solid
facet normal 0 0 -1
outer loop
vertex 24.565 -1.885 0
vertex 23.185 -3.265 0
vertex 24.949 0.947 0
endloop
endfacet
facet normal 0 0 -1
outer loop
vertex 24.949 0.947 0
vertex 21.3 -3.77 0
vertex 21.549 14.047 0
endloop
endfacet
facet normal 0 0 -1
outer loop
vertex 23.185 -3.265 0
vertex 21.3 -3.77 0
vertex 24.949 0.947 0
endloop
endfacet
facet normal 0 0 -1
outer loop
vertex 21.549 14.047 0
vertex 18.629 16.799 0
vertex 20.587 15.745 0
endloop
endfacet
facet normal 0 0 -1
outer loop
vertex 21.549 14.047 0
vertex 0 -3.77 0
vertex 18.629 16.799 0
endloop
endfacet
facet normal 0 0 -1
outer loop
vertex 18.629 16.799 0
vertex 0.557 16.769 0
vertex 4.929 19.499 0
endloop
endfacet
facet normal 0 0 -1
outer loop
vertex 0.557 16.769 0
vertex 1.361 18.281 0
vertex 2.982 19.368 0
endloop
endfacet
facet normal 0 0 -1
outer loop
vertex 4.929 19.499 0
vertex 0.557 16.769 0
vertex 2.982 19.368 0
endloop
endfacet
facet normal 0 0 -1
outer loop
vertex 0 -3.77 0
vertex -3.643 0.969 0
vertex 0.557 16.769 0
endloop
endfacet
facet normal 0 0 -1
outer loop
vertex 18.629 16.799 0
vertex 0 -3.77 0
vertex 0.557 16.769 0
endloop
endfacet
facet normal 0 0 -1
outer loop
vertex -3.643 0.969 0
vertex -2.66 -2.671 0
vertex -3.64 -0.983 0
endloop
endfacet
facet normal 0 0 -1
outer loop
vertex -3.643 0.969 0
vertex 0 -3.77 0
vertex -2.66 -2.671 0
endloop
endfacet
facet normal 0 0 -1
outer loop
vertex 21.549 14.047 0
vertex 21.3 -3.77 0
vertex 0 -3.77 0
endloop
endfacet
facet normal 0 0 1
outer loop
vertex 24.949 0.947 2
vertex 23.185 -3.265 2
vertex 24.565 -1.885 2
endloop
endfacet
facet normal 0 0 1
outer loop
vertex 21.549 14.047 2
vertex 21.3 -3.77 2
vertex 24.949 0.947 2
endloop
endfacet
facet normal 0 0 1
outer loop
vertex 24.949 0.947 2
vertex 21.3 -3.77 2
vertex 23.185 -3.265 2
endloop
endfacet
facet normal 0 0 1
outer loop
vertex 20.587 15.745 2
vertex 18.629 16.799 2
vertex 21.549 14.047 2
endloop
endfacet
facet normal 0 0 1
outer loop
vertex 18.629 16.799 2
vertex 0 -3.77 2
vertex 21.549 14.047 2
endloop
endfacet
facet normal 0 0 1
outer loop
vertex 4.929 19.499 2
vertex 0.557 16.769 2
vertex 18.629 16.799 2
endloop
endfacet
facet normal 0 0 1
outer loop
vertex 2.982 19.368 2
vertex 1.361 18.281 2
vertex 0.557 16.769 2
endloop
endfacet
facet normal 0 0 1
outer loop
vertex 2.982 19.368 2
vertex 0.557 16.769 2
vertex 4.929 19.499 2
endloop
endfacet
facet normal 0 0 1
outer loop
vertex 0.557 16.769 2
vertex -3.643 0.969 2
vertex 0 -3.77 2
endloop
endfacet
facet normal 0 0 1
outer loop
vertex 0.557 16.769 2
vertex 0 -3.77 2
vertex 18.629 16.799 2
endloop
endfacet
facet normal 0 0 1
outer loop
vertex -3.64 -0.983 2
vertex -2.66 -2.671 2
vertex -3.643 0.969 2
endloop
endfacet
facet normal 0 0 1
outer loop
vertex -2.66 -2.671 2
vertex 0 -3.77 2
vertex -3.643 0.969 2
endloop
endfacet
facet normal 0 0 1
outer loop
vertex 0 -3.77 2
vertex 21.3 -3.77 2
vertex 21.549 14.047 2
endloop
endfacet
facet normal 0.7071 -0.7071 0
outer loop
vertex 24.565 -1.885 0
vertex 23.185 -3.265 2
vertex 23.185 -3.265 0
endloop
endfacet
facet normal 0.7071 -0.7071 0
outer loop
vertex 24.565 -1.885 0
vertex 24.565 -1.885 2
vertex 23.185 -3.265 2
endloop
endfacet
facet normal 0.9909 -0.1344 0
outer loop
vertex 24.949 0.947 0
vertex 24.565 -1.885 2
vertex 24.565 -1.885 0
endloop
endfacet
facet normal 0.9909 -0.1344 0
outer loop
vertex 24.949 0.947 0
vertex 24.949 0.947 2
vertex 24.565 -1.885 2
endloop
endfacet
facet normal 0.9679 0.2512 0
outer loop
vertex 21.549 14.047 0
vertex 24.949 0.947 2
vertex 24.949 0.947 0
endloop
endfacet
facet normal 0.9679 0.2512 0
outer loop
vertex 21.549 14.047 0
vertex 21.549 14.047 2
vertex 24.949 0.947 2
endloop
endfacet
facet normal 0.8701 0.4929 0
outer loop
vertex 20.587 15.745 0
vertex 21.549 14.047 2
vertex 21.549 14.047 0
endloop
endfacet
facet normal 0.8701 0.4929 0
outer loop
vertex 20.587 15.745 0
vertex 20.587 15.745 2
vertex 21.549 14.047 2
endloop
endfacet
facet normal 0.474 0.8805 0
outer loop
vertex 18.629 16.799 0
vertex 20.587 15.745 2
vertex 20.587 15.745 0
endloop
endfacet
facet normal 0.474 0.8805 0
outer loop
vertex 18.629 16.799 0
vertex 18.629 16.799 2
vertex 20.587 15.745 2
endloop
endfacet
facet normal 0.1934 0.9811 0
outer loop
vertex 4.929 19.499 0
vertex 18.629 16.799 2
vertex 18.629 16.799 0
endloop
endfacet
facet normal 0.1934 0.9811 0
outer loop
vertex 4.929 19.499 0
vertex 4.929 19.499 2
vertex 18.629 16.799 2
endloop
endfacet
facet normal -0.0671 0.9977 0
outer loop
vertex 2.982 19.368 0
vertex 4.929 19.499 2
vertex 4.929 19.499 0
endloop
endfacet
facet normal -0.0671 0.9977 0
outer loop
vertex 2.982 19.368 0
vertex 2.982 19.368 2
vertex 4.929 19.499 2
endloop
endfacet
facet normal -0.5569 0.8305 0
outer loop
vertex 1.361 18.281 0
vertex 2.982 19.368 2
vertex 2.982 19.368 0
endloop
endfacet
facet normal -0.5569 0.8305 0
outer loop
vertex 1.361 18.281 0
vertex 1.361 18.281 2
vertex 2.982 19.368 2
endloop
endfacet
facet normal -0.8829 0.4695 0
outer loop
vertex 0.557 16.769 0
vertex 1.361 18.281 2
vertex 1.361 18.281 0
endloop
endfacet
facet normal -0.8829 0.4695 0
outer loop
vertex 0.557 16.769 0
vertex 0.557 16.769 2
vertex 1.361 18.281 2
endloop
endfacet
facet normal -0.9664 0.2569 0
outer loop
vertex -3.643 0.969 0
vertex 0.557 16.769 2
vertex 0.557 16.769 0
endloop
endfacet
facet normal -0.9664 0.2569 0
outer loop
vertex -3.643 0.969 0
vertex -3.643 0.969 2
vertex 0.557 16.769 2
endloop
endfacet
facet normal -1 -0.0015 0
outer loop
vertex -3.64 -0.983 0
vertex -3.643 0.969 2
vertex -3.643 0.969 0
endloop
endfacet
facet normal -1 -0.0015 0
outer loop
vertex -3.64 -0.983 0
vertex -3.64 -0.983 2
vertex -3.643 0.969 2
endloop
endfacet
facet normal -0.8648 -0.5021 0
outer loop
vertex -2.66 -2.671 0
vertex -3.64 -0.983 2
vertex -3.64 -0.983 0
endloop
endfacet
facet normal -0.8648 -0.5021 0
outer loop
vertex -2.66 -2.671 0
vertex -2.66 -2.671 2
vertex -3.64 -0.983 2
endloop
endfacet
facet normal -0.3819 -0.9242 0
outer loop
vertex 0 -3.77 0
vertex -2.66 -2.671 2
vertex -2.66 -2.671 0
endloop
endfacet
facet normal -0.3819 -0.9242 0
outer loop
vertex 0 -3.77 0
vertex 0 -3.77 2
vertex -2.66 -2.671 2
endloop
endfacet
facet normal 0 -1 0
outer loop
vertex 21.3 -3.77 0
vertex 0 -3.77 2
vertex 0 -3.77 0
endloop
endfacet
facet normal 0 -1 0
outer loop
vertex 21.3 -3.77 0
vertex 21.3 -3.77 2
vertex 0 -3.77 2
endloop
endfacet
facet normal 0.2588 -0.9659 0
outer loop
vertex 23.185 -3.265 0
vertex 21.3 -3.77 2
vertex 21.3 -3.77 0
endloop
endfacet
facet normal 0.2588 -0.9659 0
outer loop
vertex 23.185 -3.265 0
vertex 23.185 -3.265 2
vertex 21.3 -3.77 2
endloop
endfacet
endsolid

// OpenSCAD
// 2D offset with rounded joins - Clipper2 arc approximation
linear_extrude(2) offset(r = 3.77) polygon([[0,0],[21.3,0],[17.9,13.1],[4.2,15.8]]);
